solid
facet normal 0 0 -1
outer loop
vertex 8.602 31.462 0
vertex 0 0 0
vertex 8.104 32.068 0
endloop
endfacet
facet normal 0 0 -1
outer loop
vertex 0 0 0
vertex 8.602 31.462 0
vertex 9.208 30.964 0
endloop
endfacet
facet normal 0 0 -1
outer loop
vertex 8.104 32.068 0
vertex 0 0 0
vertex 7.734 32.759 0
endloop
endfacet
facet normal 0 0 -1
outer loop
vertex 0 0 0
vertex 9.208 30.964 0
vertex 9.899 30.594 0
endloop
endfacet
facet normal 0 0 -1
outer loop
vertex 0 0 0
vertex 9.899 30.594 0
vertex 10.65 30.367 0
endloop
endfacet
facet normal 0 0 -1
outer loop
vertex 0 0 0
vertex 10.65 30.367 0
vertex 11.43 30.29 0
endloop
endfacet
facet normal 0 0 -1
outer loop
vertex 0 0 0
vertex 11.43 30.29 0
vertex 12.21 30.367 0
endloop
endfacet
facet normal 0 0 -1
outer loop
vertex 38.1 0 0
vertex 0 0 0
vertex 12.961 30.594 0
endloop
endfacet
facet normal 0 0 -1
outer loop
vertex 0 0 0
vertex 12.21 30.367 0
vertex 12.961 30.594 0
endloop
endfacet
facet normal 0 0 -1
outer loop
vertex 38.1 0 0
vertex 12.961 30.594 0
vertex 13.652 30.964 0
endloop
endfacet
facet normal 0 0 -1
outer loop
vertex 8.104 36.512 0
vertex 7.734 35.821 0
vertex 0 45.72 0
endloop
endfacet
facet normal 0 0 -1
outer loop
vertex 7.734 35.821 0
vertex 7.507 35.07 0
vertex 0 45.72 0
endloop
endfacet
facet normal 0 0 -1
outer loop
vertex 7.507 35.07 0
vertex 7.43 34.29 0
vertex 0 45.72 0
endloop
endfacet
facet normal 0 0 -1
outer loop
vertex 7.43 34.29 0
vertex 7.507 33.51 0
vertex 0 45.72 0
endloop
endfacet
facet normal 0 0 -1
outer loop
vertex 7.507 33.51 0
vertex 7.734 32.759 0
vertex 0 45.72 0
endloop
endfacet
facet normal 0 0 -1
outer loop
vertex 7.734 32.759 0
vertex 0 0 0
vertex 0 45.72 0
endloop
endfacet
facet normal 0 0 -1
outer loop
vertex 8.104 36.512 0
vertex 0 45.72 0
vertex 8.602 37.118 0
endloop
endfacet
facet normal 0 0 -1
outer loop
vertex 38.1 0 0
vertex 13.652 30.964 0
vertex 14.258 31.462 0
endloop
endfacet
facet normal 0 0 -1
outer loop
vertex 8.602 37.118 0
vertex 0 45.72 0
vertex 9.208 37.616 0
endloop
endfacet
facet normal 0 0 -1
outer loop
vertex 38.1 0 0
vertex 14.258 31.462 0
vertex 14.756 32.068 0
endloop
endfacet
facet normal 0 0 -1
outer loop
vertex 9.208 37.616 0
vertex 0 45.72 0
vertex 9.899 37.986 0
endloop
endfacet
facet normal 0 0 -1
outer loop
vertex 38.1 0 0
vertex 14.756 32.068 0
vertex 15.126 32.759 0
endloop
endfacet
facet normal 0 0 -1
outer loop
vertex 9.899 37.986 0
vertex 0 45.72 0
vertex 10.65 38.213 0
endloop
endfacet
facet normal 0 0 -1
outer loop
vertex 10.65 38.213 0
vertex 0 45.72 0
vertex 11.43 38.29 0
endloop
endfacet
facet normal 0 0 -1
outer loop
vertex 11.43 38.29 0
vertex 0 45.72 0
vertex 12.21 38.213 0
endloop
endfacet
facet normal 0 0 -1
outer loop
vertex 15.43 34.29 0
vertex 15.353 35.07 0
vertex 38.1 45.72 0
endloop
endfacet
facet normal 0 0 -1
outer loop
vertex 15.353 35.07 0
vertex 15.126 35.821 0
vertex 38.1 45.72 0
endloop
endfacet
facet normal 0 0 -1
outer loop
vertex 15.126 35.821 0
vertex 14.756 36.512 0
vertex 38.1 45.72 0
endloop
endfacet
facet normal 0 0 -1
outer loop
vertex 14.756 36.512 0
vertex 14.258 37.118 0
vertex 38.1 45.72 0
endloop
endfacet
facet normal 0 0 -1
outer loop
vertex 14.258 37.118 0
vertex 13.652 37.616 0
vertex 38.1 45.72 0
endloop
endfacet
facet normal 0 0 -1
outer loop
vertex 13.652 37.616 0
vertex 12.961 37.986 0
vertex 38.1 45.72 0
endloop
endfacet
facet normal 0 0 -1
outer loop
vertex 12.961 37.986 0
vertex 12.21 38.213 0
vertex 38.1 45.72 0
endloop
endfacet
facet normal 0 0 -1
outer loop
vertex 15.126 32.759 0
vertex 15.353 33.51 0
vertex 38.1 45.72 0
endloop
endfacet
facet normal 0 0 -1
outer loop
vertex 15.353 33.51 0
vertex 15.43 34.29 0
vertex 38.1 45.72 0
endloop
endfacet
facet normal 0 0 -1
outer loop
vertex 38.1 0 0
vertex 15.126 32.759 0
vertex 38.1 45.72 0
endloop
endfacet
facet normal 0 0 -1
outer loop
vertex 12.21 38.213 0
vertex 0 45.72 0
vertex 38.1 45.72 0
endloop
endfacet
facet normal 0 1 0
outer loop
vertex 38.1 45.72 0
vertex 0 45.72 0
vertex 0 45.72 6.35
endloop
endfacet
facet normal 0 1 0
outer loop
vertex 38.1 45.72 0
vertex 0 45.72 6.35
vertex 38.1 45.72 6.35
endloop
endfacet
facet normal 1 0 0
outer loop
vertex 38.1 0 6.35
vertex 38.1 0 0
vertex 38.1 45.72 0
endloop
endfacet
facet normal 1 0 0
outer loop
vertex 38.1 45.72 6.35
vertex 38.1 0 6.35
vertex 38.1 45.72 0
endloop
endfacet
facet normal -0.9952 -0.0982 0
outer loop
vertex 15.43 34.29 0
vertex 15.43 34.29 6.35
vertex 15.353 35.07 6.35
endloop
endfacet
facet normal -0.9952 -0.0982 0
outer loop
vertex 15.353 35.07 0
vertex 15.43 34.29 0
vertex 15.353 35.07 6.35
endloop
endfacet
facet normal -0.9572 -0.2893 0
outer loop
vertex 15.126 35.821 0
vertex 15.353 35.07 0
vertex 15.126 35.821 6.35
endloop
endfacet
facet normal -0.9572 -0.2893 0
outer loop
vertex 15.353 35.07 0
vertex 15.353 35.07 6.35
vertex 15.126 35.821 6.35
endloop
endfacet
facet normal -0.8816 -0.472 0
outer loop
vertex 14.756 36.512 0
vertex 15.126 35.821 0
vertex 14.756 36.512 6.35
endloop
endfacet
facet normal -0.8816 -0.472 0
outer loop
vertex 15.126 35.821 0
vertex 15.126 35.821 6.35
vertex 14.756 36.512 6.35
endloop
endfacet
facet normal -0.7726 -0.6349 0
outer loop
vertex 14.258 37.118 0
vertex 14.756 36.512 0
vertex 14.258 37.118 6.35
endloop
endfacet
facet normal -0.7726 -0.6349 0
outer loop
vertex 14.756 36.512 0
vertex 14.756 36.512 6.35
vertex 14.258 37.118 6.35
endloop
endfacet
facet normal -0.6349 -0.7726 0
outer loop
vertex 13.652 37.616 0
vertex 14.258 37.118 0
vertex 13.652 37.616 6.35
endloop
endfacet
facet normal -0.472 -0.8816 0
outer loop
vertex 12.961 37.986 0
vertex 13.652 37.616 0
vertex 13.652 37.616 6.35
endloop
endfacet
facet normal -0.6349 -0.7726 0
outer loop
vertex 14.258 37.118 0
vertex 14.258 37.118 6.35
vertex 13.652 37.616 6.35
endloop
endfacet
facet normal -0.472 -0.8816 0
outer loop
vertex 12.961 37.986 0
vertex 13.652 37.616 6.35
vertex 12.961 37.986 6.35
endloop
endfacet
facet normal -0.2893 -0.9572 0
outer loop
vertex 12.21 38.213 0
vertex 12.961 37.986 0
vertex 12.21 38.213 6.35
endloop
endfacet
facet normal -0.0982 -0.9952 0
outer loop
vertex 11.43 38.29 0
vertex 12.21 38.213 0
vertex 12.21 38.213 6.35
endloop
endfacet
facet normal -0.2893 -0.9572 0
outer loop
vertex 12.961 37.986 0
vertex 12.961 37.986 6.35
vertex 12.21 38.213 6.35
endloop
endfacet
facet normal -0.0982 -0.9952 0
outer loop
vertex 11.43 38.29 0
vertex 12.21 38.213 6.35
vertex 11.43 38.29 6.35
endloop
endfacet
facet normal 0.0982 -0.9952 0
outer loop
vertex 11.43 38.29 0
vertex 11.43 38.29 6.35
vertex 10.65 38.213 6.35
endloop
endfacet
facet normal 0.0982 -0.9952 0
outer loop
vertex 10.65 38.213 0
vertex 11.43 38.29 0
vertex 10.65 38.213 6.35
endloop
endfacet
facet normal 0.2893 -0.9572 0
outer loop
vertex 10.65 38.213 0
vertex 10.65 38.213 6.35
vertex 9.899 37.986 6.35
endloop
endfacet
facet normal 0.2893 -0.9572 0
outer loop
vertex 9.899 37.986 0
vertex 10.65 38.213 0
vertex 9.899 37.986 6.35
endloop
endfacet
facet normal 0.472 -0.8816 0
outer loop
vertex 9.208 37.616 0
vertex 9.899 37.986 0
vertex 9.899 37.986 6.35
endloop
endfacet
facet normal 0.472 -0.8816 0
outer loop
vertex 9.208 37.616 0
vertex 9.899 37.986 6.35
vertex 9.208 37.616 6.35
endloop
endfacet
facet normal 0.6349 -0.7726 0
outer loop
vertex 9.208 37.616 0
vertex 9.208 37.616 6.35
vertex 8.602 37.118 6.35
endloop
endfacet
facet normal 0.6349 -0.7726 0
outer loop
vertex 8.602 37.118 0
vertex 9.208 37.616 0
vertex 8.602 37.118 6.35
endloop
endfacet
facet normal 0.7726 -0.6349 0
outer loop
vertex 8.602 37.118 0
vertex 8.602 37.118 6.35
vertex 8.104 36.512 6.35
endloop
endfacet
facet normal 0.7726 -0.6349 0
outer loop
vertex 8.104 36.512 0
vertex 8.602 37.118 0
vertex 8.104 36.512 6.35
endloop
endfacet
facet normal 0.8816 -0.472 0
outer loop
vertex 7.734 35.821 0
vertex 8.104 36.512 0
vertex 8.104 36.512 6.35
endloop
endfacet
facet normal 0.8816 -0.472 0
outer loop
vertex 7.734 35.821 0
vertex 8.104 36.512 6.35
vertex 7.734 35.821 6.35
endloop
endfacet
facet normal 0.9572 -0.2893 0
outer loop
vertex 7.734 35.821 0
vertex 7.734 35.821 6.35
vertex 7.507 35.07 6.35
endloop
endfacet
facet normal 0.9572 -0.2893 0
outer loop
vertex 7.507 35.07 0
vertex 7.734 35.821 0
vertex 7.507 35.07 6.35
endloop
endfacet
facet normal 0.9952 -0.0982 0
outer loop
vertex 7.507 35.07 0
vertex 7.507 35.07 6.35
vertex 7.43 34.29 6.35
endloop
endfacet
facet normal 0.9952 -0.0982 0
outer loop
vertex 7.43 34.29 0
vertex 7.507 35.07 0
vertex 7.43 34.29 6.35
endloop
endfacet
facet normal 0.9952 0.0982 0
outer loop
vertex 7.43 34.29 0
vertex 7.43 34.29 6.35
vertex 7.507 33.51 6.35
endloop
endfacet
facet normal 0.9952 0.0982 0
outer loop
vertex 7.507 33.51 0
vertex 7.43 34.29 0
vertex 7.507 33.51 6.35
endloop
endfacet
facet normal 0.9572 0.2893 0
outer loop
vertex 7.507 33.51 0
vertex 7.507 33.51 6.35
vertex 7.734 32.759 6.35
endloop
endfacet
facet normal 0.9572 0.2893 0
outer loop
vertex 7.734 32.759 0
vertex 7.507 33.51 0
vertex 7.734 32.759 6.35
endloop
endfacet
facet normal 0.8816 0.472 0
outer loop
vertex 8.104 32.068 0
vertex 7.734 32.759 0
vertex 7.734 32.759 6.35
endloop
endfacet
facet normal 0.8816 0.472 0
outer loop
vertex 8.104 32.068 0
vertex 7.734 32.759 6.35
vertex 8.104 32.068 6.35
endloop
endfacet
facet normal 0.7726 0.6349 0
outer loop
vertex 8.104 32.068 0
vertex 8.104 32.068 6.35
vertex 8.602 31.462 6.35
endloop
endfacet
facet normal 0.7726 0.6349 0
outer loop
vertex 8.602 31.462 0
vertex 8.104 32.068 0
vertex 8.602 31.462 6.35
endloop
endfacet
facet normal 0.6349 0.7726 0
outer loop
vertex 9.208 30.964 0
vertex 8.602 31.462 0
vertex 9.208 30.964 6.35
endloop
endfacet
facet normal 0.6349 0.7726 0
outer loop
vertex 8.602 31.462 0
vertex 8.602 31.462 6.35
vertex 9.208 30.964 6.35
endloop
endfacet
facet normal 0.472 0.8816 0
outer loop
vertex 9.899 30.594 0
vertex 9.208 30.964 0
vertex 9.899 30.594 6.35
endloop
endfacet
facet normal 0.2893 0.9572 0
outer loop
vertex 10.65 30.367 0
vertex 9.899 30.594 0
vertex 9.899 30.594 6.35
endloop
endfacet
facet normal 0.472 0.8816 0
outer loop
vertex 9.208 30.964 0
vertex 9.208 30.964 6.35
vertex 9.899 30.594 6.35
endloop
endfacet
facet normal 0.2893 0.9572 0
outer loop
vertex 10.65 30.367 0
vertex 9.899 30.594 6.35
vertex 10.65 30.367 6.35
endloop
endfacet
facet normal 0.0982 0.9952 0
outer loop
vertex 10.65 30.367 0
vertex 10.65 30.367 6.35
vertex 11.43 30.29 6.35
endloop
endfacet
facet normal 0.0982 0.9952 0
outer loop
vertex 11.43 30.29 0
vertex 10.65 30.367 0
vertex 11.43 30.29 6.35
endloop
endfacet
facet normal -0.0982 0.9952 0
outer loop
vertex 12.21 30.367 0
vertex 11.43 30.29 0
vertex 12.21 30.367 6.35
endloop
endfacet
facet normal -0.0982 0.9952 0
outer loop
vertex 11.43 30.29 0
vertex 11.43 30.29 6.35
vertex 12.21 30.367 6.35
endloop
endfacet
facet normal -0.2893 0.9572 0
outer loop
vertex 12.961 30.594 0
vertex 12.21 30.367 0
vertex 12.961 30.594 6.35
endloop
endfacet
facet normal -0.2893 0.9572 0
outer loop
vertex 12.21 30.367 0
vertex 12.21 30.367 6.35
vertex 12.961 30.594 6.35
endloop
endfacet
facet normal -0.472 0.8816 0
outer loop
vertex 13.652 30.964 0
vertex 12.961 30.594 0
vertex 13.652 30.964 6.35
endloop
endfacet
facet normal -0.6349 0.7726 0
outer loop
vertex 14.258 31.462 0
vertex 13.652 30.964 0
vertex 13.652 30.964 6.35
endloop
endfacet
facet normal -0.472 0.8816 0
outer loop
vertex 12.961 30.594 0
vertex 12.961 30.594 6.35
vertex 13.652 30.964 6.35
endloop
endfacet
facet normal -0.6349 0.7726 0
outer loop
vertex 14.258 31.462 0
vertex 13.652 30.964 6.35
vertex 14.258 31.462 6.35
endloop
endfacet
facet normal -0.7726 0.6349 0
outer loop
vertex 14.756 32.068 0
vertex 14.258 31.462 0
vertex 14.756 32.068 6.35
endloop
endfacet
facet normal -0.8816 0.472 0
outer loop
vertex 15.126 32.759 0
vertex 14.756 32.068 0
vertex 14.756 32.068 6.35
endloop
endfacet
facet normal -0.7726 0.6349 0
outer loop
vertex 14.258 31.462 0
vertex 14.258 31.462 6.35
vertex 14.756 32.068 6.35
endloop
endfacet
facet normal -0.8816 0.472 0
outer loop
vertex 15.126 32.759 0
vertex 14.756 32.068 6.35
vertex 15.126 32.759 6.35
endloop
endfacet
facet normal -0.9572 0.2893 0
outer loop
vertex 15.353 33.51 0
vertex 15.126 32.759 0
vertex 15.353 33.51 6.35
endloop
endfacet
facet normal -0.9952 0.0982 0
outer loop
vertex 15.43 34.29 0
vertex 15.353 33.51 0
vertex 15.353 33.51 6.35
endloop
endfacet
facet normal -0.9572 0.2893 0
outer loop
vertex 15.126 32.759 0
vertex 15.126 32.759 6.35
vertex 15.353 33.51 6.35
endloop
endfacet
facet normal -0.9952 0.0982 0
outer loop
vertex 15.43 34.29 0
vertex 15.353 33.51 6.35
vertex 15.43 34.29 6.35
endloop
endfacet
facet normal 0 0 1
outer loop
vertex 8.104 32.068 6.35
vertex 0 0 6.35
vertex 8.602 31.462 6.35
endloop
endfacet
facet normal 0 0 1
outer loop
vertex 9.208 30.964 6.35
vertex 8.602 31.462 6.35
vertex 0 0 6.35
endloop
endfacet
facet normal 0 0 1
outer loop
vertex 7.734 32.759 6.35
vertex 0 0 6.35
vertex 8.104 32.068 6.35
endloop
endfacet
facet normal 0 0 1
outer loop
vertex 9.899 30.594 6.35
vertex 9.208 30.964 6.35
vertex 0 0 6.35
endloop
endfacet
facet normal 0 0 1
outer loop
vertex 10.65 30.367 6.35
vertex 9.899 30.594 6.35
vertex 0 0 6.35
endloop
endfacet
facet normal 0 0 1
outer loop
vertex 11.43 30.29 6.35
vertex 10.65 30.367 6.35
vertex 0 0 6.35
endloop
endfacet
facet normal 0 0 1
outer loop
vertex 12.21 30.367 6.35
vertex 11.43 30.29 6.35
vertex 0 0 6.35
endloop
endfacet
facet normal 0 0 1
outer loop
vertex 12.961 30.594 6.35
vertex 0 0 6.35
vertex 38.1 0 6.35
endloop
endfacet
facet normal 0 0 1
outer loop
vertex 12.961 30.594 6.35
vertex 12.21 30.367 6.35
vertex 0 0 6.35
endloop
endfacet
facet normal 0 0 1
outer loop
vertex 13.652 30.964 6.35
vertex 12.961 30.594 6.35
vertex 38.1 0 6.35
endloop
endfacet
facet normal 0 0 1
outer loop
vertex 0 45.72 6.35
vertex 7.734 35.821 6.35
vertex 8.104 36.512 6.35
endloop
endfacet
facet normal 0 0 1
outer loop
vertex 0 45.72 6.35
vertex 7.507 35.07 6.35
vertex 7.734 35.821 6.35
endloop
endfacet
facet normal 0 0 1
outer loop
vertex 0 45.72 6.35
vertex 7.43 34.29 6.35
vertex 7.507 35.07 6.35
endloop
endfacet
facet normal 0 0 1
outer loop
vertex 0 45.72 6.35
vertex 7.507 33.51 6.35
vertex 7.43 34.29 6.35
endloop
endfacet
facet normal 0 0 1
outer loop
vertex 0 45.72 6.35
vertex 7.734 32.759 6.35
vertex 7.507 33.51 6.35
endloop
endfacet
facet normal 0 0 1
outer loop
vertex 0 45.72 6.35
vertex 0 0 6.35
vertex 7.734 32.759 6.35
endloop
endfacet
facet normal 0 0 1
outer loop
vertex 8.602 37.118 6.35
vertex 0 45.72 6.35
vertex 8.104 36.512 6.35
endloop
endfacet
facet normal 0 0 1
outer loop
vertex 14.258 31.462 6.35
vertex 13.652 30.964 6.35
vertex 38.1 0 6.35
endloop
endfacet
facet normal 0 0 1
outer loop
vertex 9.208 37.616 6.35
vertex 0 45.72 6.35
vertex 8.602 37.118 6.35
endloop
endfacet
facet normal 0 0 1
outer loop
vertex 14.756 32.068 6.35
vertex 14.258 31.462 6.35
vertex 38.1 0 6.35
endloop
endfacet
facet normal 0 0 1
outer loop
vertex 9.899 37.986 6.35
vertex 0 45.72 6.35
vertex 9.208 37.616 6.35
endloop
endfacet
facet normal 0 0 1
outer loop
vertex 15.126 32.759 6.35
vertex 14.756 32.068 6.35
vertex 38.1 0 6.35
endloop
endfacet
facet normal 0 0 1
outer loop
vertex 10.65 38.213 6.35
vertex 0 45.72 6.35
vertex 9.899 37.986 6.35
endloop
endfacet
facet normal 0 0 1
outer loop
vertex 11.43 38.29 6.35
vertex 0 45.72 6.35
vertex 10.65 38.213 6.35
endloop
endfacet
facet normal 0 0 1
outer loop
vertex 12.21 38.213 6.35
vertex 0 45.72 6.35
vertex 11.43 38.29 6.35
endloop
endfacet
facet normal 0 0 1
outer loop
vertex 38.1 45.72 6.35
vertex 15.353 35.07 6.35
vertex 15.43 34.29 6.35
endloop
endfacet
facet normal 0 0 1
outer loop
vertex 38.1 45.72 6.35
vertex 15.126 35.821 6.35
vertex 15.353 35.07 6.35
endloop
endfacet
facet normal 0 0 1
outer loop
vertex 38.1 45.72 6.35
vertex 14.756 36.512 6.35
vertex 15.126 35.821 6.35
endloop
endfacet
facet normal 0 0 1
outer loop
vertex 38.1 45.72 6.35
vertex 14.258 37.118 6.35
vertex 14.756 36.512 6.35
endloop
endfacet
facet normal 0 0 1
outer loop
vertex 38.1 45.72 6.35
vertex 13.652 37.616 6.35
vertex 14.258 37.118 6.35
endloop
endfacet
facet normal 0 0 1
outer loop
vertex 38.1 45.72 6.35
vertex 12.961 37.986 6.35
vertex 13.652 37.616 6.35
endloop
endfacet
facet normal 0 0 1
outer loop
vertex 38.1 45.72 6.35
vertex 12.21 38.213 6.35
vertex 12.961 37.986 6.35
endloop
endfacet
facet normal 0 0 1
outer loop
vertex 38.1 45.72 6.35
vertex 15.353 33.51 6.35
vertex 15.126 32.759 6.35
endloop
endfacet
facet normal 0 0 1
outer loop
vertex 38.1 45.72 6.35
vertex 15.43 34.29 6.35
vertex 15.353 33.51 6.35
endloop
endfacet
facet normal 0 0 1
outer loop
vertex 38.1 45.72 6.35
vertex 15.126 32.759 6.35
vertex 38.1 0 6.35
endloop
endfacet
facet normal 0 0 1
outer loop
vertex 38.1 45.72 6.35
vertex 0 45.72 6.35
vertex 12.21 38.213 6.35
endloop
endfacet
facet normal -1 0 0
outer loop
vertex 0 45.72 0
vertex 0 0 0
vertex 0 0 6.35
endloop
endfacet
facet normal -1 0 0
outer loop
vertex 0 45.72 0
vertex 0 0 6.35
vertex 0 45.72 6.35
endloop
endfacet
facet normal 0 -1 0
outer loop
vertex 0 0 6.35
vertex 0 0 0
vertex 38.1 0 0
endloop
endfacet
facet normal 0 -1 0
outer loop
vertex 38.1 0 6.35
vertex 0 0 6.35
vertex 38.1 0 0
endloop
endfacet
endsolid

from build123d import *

# Parameters (mm, degrees)
SKETCH1_W               = 38.1
SKETCH1_H               = 45.72
BOSS_EXTRUDE1_DEPTH     = 6.35
SKETCH2_R               = 4
CUT_EXTRUDE1_DEPTH      = 1
CUT_EXTRUDE1_DEPTH_BACK = 7.35


with BuildPart() as part:
    # Sketch1 → Boss-Extrude1 (new body)
    with BuildSketch(Plane.XY):
        with Locations((19.05, 22.86)):
            Rectangle(SKETCH1_W, SKETCH1_H)
    extrude(amount=BOSS_EXTRUDE1_DEPTH)

    # Sketch2 → Cut-Extrude1 (cut, two sides)
    with BuildSketch(Plane.XY.offset(6.35)) as cut_extrude1_sk:
        with Locations((11.43, 34.29)):
            Circle(SKETCH2_R)
    extrude(amount=CUT_EXTRUDE1_DEPTH, mode=Mode.SUBTRACT)
    extrude(cut_extrude1_sk.sketch, amount=-CUT_EXTRUDE1_DEPTH_BACK, mode=Mode.SUBTRACT)


solid = part.part
